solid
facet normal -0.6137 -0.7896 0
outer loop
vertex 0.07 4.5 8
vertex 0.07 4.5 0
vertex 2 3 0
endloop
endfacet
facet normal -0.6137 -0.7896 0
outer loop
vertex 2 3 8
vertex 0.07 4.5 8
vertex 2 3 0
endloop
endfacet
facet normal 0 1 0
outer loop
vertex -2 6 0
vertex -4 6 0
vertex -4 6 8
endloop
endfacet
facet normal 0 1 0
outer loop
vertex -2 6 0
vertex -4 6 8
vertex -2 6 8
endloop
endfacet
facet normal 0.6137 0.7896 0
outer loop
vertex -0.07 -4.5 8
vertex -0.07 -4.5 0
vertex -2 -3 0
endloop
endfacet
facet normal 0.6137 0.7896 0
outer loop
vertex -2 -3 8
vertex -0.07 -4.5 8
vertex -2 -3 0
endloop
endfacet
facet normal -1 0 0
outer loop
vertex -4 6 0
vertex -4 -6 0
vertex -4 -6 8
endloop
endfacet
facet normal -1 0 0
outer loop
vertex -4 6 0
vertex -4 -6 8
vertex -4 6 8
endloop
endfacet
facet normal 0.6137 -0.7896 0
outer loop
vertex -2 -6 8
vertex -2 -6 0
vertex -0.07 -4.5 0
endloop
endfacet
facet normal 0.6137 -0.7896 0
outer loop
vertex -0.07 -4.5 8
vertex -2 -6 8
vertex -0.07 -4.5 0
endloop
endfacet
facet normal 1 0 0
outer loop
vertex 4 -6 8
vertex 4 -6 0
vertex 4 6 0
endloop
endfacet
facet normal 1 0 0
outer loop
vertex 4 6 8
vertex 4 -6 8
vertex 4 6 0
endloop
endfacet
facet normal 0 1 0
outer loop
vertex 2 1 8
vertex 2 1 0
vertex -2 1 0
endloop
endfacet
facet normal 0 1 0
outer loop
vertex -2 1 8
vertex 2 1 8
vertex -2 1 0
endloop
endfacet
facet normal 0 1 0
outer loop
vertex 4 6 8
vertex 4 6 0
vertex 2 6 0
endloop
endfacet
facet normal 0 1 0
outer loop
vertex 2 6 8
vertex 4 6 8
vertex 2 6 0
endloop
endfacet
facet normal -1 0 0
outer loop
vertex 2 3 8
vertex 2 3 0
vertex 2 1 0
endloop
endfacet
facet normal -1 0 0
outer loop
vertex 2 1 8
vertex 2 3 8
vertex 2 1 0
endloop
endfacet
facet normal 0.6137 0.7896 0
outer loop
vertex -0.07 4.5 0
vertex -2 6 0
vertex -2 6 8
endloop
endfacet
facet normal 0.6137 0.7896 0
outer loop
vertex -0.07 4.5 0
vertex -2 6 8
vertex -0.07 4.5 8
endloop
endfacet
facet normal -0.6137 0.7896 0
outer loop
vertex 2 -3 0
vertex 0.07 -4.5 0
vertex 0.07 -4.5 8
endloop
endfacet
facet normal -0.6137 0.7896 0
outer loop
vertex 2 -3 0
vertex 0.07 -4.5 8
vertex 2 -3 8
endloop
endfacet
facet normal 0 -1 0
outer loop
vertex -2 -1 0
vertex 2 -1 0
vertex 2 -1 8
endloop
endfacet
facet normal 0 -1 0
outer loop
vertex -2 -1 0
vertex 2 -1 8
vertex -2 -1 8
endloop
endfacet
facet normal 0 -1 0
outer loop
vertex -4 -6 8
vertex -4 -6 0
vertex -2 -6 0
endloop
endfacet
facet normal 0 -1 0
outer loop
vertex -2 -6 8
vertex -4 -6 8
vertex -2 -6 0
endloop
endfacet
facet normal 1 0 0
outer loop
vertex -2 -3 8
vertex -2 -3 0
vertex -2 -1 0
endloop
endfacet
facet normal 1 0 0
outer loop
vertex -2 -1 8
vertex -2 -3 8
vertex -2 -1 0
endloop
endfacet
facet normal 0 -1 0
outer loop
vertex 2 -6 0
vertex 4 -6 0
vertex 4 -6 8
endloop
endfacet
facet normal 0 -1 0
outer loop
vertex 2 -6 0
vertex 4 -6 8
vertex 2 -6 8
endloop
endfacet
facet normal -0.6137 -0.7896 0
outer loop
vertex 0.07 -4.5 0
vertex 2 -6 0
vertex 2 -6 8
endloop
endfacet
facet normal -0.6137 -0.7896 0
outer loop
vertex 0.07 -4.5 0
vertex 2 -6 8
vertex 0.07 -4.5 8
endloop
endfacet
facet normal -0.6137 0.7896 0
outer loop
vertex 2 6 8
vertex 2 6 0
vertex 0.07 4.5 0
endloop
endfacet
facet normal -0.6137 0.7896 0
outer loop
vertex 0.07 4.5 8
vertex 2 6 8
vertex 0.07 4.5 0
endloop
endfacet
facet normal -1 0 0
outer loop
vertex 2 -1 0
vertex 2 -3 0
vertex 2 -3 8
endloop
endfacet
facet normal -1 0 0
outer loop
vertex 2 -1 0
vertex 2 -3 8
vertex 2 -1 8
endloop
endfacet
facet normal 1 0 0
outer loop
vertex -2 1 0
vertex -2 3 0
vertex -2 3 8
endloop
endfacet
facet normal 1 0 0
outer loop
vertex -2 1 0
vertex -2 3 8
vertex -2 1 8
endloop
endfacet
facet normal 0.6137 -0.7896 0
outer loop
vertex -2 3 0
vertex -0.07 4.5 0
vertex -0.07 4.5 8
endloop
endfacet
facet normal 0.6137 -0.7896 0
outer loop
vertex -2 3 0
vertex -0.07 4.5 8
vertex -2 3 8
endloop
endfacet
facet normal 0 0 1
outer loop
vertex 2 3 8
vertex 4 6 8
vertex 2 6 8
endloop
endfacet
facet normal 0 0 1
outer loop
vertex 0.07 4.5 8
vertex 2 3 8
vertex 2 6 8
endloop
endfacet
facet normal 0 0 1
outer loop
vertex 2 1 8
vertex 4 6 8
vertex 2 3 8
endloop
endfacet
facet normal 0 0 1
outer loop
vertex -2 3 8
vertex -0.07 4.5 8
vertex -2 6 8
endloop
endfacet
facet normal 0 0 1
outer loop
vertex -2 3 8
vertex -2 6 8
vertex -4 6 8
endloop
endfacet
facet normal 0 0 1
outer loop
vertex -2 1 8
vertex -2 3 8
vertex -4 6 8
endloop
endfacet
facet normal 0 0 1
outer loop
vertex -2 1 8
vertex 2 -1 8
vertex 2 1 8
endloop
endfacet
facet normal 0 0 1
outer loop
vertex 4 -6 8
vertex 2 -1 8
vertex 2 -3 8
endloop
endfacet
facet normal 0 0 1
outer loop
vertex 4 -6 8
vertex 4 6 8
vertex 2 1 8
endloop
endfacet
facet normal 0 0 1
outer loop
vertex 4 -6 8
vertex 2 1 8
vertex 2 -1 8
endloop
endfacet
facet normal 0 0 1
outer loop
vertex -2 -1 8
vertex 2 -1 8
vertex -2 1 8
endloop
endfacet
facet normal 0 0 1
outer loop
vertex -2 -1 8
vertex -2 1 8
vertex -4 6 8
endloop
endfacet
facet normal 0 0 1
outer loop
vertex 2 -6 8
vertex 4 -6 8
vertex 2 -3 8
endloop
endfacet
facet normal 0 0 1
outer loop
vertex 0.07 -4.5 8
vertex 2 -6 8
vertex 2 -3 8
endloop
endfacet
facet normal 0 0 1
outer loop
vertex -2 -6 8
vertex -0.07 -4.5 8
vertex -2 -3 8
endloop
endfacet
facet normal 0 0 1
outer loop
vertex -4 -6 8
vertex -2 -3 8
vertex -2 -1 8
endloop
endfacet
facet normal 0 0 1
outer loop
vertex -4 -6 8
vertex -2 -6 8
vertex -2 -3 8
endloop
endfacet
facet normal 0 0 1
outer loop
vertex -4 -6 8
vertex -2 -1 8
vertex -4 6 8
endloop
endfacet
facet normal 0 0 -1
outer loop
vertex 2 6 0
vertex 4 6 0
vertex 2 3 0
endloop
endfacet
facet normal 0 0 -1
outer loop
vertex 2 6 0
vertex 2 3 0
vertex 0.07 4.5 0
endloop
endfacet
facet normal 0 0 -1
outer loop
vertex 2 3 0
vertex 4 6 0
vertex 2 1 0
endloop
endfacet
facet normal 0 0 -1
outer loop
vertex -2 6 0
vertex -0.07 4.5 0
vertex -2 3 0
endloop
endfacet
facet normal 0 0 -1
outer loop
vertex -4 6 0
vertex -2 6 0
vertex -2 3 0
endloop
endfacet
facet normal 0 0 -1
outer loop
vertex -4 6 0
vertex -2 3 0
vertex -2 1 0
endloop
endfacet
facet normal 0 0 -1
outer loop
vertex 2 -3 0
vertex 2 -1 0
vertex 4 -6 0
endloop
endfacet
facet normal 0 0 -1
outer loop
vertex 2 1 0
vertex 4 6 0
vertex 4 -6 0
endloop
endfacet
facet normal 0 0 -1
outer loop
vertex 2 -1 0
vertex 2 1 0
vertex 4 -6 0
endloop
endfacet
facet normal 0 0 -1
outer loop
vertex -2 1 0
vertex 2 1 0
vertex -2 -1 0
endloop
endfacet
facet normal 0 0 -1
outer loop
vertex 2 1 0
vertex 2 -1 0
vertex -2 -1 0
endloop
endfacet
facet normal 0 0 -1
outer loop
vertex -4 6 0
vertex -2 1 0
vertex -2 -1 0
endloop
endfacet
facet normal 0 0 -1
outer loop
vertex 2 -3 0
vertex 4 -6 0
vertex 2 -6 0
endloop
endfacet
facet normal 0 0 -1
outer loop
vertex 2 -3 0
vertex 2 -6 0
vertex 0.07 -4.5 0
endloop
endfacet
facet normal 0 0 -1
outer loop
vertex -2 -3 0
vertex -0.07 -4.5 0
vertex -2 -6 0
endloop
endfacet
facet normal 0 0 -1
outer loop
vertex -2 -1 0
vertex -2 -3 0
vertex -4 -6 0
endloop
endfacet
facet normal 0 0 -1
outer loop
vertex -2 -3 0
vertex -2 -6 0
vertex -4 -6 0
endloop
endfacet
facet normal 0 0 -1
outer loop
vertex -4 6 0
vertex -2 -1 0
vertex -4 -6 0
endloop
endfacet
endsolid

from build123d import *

# Parameters (mm, degrees)
F2_DEPTH = 8


with BuildPart() as f2:
    # F1 (on Top) → F2 (new body)
    with BuildSketch(Plane.XY):
        Polygon((-0.07, -4.5), (-2, -3), (-2, -1), (0, -1), (0, 0), (-4, 0), (-4, -6), (-2, -6), align=None)
    extrude(amount=F2_DEPTH)

    # F3: F2 across plane


with BuildPart() as f2_1:
    add(f2.part)
    add(f2.part.mirror(Plane.YZ))

    # F4: F2 across plane


with BuildPart() as f2_2:
    add(f2_1.part)
    add(f2_1.part.mirror(Plane.XZ))


solid = f2_2.part
